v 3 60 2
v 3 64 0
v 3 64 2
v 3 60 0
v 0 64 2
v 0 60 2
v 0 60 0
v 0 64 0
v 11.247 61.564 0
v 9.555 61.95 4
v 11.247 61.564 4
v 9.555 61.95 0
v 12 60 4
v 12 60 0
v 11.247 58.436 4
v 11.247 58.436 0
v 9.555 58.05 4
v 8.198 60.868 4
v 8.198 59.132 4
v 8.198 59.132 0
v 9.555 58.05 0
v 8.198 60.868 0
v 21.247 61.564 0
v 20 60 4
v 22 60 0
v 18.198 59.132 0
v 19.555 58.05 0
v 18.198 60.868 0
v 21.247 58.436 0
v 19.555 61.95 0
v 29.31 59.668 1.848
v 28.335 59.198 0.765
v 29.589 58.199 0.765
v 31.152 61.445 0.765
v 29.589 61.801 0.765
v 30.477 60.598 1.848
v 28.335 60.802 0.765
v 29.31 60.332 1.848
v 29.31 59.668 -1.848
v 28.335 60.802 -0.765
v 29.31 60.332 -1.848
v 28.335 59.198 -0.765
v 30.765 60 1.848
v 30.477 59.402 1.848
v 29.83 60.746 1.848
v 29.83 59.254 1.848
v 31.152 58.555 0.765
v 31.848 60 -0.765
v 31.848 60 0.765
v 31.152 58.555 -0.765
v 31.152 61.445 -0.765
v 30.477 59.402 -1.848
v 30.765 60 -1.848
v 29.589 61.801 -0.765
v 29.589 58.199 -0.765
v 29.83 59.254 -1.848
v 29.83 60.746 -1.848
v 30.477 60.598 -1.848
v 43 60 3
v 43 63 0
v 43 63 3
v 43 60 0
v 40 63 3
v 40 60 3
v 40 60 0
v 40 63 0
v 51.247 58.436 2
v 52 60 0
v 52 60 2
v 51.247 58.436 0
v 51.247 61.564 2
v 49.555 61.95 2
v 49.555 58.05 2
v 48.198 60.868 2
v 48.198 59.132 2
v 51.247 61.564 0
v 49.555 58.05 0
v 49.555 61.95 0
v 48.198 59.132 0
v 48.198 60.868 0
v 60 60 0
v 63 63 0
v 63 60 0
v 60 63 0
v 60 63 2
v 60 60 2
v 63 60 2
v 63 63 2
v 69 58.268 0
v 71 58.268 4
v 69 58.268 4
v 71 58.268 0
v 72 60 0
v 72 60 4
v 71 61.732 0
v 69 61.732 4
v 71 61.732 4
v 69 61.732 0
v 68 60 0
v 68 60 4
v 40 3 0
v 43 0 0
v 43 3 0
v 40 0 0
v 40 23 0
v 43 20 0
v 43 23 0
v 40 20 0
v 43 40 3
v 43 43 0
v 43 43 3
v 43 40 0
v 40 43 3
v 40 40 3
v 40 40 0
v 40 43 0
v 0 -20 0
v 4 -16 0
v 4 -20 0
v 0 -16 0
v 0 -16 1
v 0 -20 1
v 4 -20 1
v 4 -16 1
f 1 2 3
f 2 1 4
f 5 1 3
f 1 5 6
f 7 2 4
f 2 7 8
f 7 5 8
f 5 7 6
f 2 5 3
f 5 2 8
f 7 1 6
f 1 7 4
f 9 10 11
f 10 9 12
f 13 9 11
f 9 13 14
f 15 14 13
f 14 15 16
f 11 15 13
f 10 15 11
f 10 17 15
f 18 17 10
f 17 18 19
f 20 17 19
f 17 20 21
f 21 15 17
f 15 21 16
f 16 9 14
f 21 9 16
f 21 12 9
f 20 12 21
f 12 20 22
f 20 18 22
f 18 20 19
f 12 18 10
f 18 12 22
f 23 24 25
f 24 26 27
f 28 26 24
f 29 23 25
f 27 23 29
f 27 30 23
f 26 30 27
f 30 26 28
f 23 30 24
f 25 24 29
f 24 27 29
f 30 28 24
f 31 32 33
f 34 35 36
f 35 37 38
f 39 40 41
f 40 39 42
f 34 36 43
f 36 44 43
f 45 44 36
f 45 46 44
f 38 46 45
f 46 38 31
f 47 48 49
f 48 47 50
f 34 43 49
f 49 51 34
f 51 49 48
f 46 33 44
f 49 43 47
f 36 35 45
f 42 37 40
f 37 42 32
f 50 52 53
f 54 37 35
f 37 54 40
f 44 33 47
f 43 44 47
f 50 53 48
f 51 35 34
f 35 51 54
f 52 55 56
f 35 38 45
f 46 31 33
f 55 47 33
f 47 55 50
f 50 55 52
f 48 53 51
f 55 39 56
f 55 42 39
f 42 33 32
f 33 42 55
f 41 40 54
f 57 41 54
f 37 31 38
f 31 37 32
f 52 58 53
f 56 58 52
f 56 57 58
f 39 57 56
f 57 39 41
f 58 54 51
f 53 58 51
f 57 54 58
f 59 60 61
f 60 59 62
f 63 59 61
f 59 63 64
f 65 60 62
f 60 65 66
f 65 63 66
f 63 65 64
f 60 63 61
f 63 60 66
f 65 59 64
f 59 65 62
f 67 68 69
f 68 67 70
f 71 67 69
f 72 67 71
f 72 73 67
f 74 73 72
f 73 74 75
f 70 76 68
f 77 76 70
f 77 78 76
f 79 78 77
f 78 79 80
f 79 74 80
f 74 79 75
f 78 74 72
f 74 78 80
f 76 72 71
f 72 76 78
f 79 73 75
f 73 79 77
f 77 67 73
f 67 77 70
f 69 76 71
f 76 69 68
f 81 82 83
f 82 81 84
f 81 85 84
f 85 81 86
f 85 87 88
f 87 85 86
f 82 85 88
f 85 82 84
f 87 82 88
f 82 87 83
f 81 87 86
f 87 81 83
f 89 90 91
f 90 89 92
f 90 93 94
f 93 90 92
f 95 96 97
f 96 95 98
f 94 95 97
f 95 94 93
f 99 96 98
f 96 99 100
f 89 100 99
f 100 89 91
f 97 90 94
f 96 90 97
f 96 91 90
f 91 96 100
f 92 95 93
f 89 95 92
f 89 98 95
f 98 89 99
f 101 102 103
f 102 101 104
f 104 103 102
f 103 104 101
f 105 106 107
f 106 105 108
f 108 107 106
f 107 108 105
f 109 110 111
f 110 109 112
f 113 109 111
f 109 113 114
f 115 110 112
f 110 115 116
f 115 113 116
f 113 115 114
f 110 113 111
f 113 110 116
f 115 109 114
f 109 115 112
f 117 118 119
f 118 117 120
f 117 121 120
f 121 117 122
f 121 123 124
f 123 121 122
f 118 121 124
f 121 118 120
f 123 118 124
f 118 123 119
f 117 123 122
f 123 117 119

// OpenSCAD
// OpenSCAD builds NOTHING for a size <= 0 or one that is not finite, and renders the rest: every bad
// part below is empty there, so only the good row counts. The sizes come in as module parameters, so
// they are decided at RUN time (the _box / _cyl / … guards); the literals at the end at transpile time.
module parts(w, r, h, s) {
  cube([w, 4, 2]);
  translate([10, 0, 0]) cylinder(r = r, h = h);
  translate([20, 0, 0]) cylinder(r1 = r, r2 = 0, h = h);   // one zero radius is a cone, not empty
  translate([30, 0, 0]) sphere(r);
  translate([40, 0, 0]) scale([1, 1, s]) cube(3);           // a 0 factor flattens a solid to nothing
  translate([50, 0, 0]) linear_extrude(2) circle(r);
  translate([60, 0, 0]) linear_extrude(2) square([w, 3]);
  translate([70, 0, 0]) cylinder(r = r, h = h, $fn = 6);
}
parts(0, 0, 0, 0);
translate([0, 20, 0]) parts(-1, -2, -3, 0);
translate([0, 40, 0]) parts(1 / 0, 1 / 0, 1 / 0, 1);       // only the scaled cube is real here
translate([0, 60, 0]) parts(3, 2, 4, 1);                   // the real ones
cube([0, 42, 1.6]);
cylinder(r1 = 0, r2 = 0, h = 5);
translate([0, -20, 0]) linear_extrude(1) scale([1, 1, 0]) square(4);   // a 2D profile ignores z = 0
translate([10, -20, 0]) linear_extrude(1) scale([0, 1]) square(4);     // … but not x = 0
